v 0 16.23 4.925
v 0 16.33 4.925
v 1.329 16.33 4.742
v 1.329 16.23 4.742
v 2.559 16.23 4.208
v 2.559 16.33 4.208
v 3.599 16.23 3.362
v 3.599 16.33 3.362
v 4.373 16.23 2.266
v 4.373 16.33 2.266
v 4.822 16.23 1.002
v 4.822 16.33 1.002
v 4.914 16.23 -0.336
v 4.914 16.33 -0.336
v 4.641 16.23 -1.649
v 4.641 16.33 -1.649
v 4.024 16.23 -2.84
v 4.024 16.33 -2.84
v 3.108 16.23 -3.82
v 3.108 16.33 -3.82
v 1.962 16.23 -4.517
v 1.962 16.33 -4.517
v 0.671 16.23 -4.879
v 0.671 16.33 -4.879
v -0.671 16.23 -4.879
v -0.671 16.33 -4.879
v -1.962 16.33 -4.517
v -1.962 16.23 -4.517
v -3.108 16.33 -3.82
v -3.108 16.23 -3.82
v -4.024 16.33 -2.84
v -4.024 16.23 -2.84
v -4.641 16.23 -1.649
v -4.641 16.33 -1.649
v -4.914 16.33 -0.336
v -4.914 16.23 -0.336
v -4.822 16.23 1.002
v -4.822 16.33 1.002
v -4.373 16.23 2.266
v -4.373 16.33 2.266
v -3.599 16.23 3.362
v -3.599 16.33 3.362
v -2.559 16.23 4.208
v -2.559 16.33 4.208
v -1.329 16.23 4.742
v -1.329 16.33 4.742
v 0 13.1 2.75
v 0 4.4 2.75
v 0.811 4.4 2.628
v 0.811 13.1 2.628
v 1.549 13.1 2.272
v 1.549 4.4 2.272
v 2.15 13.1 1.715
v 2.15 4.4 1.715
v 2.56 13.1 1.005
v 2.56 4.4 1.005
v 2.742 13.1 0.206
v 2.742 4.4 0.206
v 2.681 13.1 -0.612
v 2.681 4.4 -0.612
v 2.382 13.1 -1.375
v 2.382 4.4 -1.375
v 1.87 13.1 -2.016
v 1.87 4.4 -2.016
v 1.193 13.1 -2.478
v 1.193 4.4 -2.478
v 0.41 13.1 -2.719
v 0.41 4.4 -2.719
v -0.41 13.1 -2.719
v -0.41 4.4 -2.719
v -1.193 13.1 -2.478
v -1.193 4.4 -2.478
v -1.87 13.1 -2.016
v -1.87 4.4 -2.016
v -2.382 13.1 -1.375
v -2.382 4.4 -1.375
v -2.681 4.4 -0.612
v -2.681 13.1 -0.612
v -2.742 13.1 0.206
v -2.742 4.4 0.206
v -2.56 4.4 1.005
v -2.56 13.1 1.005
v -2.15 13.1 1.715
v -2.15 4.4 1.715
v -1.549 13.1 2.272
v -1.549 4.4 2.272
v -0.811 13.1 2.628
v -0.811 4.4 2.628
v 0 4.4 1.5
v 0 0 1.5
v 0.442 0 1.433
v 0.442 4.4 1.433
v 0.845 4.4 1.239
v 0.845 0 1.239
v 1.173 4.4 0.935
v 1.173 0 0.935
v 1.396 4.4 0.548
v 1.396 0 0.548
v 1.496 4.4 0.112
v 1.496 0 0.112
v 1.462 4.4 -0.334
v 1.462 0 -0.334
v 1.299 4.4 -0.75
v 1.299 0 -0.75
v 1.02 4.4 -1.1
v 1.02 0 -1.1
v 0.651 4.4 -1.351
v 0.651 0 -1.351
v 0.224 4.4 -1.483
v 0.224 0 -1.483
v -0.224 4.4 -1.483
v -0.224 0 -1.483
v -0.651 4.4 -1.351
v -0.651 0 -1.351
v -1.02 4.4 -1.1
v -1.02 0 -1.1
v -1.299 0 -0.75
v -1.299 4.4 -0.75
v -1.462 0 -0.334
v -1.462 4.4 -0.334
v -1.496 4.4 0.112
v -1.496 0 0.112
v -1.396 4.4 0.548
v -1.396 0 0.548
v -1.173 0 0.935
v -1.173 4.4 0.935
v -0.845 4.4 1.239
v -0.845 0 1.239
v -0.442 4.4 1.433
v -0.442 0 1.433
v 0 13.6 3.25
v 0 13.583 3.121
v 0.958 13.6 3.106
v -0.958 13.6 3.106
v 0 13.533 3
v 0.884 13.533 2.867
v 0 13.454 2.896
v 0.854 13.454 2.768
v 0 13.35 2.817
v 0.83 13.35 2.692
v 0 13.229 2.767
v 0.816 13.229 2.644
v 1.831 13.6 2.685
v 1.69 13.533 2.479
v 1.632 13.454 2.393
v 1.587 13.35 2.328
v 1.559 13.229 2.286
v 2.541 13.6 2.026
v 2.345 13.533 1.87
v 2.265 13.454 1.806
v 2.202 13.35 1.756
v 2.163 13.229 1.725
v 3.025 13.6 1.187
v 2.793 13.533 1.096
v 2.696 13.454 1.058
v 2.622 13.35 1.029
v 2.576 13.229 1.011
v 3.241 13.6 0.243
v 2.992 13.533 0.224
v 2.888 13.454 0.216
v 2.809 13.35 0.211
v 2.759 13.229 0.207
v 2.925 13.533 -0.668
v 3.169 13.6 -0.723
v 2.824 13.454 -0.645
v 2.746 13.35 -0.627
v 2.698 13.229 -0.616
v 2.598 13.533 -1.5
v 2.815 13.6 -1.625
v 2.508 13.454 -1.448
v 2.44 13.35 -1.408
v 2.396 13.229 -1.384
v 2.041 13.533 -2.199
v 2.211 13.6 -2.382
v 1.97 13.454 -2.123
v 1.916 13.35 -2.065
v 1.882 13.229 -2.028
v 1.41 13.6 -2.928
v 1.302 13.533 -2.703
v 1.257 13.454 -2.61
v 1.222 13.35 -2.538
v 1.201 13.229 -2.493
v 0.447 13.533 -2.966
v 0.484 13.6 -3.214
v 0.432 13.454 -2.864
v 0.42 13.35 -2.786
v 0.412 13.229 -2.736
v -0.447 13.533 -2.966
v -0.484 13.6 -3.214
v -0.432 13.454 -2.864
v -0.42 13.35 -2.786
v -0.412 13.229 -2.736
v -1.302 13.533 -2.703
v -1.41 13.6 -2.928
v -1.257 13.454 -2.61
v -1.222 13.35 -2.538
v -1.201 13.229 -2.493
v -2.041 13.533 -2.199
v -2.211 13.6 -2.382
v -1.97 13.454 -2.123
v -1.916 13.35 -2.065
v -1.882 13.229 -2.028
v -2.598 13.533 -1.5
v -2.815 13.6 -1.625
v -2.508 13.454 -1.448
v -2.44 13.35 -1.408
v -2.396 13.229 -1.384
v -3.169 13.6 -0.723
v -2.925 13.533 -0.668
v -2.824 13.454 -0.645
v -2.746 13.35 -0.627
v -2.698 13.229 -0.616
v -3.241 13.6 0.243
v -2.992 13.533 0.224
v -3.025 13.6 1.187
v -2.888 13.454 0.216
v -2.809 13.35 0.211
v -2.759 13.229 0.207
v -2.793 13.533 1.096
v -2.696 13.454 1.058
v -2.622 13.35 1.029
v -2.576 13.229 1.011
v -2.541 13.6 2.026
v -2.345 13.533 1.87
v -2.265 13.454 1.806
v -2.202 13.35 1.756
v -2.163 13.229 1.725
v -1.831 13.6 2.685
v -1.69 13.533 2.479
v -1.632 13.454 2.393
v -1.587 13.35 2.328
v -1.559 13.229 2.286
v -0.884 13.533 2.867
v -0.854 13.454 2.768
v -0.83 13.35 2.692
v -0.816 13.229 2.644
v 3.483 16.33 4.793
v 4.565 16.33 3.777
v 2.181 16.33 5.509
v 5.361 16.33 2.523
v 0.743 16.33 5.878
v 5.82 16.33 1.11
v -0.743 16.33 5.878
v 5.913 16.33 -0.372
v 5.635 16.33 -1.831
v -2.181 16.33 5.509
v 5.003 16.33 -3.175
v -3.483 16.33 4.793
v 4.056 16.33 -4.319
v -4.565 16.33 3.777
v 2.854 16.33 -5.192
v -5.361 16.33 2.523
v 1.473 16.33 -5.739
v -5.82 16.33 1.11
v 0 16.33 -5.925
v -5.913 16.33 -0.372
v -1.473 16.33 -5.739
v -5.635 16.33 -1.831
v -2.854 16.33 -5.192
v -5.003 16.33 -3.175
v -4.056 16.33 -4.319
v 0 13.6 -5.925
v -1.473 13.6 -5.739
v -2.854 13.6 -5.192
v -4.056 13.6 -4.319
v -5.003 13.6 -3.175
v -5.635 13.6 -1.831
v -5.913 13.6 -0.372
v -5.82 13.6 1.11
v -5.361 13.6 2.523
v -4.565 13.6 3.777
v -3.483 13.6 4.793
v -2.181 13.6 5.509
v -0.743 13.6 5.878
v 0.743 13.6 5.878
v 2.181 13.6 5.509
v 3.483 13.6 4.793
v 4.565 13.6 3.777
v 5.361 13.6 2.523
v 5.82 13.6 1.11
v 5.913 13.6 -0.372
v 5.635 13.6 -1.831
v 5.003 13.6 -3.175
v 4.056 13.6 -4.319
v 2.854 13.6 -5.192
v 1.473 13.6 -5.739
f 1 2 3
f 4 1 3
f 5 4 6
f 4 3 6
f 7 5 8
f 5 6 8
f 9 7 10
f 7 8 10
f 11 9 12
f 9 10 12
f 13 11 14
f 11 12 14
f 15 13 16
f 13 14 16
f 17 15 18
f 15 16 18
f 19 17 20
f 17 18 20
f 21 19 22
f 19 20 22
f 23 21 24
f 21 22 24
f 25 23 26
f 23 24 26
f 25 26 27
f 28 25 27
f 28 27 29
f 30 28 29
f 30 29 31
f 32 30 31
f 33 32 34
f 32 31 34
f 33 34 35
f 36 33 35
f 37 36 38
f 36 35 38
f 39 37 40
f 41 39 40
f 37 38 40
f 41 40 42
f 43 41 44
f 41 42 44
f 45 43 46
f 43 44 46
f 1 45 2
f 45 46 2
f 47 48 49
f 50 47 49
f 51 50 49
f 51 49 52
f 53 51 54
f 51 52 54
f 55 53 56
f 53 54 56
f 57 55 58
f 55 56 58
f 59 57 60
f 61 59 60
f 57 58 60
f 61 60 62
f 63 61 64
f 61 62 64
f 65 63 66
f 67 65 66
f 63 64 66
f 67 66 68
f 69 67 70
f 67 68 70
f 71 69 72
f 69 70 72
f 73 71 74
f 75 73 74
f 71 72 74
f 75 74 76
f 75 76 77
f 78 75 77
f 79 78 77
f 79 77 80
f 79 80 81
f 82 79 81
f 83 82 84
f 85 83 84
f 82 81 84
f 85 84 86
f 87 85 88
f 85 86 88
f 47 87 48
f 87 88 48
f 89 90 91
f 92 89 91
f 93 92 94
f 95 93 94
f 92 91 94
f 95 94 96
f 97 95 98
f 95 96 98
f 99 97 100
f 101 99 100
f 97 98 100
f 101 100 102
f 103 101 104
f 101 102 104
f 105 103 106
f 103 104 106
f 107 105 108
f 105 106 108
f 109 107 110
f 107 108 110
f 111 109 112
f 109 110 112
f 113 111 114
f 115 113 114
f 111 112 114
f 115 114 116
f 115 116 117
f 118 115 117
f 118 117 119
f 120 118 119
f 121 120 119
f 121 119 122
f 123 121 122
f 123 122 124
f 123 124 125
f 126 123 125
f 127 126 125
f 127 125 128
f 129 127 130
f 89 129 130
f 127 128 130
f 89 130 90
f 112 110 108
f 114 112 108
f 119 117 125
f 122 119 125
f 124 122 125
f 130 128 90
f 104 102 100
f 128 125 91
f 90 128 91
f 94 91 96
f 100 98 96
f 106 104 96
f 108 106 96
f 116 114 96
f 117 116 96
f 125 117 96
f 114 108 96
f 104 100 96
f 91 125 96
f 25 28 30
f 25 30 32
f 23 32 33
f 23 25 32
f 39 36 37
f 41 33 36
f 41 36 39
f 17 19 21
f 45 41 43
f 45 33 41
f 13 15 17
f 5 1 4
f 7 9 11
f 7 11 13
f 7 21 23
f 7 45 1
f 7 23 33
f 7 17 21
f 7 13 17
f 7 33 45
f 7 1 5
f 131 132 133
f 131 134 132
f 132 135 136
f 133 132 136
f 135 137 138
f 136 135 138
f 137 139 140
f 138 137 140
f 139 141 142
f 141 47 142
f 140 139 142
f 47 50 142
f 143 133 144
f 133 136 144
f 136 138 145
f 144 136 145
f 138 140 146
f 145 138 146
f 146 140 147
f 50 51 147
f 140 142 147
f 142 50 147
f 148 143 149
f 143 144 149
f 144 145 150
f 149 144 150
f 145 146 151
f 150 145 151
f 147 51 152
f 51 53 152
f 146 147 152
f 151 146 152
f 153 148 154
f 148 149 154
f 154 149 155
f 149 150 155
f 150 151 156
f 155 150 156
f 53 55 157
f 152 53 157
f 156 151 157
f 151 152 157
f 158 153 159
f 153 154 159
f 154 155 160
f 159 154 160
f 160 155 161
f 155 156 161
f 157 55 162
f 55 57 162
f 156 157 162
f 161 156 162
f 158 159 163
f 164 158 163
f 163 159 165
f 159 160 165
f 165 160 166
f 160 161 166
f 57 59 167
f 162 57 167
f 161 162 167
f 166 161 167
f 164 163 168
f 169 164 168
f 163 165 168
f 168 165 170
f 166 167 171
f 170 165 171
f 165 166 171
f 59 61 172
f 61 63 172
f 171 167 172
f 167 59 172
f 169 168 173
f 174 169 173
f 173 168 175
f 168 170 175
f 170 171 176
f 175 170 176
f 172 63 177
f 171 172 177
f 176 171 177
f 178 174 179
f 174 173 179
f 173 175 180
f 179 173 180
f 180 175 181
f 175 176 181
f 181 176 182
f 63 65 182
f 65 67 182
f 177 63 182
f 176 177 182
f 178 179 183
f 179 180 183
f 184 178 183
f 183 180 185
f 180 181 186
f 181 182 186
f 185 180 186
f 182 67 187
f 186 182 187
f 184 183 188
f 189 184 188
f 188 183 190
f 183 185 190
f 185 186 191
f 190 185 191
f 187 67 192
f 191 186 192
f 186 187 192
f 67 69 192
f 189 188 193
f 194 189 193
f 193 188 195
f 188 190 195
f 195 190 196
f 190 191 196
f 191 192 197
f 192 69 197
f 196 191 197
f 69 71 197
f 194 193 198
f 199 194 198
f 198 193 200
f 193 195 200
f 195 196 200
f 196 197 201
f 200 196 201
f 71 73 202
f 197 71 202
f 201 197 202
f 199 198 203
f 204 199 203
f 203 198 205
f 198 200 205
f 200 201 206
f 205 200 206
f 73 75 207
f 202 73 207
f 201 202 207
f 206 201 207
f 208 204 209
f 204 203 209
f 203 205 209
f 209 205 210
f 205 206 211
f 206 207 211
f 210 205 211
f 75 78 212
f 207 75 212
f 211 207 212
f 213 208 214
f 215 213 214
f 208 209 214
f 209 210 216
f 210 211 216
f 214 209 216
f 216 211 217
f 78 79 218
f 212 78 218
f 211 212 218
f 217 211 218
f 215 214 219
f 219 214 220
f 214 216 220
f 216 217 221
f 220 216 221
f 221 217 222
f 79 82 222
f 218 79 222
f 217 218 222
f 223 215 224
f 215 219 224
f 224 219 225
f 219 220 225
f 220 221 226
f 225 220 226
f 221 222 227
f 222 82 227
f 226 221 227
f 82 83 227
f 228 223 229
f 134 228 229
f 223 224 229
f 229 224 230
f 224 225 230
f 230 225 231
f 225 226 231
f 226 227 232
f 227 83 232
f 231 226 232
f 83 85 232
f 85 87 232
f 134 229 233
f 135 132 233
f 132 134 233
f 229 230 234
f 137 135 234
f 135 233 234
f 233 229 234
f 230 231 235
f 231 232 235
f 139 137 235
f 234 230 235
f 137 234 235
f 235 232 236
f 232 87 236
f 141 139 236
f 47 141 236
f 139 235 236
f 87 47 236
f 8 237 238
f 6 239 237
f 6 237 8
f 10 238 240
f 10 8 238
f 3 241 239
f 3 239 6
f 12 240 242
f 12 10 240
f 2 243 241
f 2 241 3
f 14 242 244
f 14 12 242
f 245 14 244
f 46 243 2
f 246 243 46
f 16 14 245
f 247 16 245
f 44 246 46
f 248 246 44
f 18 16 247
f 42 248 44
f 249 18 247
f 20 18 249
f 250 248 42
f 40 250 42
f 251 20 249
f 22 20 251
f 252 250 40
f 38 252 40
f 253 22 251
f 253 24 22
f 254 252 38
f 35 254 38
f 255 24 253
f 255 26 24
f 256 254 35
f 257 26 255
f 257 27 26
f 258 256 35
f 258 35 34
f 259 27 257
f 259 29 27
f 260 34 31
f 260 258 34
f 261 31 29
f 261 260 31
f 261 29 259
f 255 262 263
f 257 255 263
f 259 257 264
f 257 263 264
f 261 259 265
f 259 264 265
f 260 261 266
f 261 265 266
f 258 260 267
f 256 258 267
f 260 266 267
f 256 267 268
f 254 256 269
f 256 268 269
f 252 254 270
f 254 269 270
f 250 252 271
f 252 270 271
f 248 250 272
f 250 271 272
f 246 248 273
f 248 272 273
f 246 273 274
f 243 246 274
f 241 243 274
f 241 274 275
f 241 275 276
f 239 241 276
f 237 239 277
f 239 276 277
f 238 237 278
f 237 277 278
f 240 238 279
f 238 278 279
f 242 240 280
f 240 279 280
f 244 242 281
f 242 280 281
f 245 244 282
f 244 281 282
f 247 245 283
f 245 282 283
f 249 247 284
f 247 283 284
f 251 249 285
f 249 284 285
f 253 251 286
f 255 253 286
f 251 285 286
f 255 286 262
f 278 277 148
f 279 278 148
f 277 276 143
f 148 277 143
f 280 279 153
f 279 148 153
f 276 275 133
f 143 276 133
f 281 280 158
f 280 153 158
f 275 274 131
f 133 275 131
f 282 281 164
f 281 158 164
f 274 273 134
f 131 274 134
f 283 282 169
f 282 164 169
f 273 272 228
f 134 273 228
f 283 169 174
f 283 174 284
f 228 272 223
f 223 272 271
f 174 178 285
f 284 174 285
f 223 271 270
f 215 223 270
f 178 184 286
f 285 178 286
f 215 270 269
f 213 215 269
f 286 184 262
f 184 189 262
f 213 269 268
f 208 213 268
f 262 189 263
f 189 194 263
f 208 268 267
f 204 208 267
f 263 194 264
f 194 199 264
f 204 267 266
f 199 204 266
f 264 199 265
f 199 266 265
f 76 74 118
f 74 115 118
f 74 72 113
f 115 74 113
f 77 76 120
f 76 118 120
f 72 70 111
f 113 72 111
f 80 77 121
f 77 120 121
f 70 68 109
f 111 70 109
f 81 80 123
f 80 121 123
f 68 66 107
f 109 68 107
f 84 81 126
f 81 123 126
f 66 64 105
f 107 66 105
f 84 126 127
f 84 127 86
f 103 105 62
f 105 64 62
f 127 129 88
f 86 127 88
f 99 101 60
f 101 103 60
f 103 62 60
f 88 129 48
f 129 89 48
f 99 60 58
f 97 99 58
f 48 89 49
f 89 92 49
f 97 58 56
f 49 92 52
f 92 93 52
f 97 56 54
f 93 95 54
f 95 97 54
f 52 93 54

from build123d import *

# Parameters (mm, degrees)
SKETCH1_R           = 1.5
BOSS_EXTRUDE1_DEPTH = 4.4
SKETCH2_R           = 2.75
BOSS_EXTRUDE2_DEPTH = 9.2
SKETCH3_R           = 5.925
BOSS_EXTRUDE3_DEPTH = 2.73
FILLET1_R           = 0.5
SKETCH4_R           = 4.925
CUT_EXTRUDE1_DEPTH  = 0.1


with BuildPart() as part:
    # Sketch1 → Boss-Extrude1 (new body)
    with BuildSketch(Plane(origin=(0, 0, 0), x_dir=(1, 0, 0), z_dir=(0, 1, 0))):
        with Locations(Location((0, 0, 0), (0, 0, 270))):
            Circle(SKETCH1_R)
    extrude(amount=BOSS_EXTRUDE1_DEPTH)

    # Sketch2 → Boss-Extrude2 (add)
    with BuildSketch(Plane(origin=(0, 4.4, 0), x_dir=(1, 0, 0), z_dir=(0, 1, 0))):
        with Locations(Location((0, 0, 0), (0, 0, 270))):
            Circle(SKETCH2_R)
    extrude(amount=BOSS_EXTRUDE2_DEPTH)

    # Sketch3 → Boss-Extrude3 (add)
    with BuildSketch(Plane(origin=(0, 13.6, 0), x_dir=(1, 0, 0), z_dir=(0, 1, 0))):
        with Locations(Location((0, 0, 0), (0, 0, 90))):
            Circle(SKETCH3_R)
    extrude(amount=BOSS_EXTRUDE3_DEPTH)

    # Fillet1
    fillet1_edges = [part.edges().sort_by_distance(p)[0] for p in [
        (0, 13.6, -2.75),
    ]]
    fillet(fillet1_edges, radius=FILLET1_R)

    # Sketch4 → Cut-Extrude1 (cut)
    with BuildSketch(Plane(origin=(0, 16.33, 0), x_dir=(1, 0, 0), z_dir=(0, 1, 0))):
        with Locations(Location((0, 0, 0), (0, 0, 270))):
            Circle(SKETCH4_R)
    extrude(amount=-CUT_EXTRUDE1_DEPTH, mode=Mode.SUBTRACT)


solid = part.part
